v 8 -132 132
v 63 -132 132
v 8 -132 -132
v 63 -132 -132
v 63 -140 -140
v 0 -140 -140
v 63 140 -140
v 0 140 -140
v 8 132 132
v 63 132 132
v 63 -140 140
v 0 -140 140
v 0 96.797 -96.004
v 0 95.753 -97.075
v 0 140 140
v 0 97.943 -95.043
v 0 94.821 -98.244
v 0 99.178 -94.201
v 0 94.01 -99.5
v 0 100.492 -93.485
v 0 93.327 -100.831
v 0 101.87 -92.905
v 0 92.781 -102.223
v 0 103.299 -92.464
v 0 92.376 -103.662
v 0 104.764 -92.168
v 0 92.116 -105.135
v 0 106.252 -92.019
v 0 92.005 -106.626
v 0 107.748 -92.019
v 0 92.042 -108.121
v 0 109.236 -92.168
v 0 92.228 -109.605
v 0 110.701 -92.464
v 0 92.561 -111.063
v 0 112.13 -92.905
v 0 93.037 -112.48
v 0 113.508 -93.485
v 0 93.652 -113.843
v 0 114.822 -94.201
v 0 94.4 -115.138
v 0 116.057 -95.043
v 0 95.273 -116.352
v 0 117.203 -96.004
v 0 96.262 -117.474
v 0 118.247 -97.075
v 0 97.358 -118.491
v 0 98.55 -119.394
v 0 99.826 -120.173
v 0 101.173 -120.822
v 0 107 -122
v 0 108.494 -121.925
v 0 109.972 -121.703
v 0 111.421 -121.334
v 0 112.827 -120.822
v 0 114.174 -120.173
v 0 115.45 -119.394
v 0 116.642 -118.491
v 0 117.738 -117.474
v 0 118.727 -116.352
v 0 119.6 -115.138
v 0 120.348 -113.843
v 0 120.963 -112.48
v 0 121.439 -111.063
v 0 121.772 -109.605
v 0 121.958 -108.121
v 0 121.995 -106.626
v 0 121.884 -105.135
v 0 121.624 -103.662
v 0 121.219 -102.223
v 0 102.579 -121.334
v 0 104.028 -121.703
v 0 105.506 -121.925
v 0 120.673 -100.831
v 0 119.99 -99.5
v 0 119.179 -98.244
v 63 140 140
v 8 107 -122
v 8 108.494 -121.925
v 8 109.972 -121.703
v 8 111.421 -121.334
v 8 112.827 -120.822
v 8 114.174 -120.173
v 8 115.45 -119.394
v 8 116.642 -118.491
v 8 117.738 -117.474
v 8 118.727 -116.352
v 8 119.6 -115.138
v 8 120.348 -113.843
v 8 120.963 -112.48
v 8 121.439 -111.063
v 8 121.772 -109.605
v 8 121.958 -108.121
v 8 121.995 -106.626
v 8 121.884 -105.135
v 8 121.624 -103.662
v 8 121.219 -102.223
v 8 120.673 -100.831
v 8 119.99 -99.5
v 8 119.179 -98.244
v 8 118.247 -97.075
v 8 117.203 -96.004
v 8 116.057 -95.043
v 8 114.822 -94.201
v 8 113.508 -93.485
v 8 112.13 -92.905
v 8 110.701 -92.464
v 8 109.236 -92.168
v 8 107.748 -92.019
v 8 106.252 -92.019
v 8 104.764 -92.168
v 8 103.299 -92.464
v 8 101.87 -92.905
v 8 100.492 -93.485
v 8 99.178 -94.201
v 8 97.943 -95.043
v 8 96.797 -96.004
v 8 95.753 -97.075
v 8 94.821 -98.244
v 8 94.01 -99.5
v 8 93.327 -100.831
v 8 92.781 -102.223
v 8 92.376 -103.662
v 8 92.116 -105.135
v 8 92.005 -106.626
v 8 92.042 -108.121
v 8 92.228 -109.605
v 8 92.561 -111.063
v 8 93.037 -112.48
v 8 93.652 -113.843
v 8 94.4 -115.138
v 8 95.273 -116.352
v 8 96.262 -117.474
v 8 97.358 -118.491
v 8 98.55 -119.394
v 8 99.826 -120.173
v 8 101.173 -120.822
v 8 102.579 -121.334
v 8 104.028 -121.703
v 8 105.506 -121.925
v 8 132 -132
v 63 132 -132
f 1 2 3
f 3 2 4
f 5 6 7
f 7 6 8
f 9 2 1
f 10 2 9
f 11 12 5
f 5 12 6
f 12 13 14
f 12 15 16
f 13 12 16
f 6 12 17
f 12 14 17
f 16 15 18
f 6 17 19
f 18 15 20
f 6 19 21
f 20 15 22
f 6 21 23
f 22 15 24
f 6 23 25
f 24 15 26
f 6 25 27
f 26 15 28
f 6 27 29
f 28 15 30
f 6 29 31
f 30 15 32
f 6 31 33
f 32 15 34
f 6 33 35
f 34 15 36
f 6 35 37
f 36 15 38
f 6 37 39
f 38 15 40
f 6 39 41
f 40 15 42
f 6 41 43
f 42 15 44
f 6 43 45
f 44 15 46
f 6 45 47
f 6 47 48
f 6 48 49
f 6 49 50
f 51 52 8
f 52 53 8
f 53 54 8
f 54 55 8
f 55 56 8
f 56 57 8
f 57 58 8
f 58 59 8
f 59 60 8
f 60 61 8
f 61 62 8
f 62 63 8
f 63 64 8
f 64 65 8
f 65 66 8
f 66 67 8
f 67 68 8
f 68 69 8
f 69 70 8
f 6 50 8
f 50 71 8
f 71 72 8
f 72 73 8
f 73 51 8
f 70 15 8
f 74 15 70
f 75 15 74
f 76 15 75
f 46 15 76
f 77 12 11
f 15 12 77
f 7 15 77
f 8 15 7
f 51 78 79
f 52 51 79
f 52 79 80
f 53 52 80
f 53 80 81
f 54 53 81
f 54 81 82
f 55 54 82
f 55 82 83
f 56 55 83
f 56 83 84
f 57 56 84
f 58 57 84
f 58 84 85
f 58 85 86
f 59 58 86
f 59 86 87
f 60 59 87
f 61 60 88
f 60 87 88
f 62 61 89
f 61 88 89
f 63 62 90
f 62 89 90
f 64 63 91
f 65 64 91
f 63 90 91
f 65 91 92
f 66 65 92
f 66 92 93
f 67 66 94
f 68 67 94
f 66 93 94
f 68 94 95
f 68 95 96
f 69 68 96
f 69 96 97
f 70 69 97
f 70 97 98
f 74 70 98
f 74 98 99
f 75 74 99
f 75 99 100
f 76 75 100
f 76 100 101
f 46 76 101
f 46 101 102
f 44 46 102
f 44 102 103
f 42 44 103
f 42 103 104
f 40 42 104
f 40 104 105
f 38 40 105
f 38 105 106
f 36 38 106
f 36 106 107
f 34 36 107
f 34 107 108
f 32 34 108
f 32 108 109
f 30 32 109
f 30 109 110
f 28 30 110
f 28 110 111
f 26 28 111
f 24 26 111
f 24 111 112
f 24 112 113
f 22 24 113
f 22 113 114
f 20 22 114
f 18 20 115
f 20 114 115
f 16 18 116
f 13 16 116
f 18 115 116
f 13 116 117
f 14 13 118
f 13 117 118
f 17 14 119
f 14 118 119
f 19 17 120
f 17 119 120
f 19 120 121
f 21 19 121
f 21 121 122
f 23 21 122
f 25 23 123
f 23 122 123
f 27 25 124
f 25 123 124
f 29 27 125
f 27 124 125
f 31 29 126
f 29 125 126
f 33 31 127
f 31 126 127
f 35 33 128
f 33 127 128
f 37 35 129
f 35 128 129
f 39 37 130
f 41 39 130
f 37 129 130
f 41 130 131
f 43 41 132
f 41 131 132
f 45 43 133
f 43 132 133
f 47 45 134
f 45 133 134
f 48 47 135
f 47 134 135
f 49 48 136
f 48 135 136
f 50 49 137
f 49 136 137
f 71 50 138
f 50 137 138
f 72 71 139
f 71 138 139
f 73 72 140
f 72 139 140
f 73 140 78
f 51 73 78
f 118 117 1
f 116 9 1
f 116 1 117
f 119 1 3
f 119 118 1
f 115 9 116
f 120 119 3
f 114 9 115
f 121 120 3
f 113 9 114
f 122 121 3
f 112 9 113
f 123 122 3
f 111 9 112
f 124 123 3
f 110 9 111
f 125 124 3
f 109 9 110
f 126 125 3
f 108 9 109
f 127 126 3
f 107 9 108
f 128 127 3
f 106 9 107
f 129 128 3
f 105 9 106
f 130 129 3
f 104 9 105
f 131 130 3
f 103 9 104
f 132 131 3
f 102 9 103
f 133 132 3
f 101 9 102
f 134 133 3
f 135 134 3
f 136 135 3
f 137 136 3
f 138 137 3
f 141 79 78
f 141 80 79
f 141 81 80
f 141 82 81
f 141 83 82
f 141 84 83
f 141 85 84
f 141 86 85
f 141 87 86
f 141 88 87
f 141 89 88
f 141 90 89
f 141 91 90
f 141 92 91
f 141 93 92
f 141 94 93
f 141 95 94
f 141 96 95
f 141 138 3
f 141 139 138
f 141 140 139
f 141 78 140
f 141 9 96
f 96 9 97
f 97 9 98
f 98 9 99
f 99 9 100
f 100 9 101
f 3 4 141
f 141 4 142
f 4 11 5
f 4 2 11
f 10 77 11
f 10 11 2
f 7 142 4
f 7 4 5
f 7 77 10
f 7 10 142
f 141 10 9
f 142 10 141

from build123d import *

# Parameters (mm, degrees)
SKETCH1_W           = 280
SKETCH1_H           = 280
BOSS_EXTRUDE1_DEPTH = 63
SKETCH2_W           = 264
SKETCH2_H           = 264
CUT_EXTRUDE1_DEPTH  = 55
SKETCH4_R           = 15
CUT_EXTRUDE2_DEPTH  = 55


with BuildPart() as part:
    # Sketch1 → Boss-Extrude1 (new body)
    with BuildSketch(Plane(origin=(0, 0, 0), x_dir=(0, 0, -1), z_dir=(1, 0, 0))):
        Rectangle(SKETCH1_W, SKETCH1_H)
    extrude(amount=BOSS_EXTRUDE1_DEPTH)

    # Sketch2 → Cut-Extrude1 (cut)
    with BuildSketch(Plane(origin=(63, 0, 0), x_dir=(0, 0, -1), z_dir=(1, 0, 0))):
        Rectangle(SKETCH2_W, SKETCH2_H)
    extrude(amount=-CUT_EXTRUDE1_DEPTH, mode=Mode.SUBTRACT)

    # Sketch4 → Cut-Extrude2 (cut)
    with BuildSketch(Plane(origin=(8, 0, 0), x_dir=(0, 0, -1), z_dir=(1, 0, 0))):
        with Locations((107, 107)):
            Circle(SKETCH4_R)
    extrude(amount=-CUT_EXTRUDE2_DEPTH, mode=Mode.SUBTRACT)


solid = part.part
